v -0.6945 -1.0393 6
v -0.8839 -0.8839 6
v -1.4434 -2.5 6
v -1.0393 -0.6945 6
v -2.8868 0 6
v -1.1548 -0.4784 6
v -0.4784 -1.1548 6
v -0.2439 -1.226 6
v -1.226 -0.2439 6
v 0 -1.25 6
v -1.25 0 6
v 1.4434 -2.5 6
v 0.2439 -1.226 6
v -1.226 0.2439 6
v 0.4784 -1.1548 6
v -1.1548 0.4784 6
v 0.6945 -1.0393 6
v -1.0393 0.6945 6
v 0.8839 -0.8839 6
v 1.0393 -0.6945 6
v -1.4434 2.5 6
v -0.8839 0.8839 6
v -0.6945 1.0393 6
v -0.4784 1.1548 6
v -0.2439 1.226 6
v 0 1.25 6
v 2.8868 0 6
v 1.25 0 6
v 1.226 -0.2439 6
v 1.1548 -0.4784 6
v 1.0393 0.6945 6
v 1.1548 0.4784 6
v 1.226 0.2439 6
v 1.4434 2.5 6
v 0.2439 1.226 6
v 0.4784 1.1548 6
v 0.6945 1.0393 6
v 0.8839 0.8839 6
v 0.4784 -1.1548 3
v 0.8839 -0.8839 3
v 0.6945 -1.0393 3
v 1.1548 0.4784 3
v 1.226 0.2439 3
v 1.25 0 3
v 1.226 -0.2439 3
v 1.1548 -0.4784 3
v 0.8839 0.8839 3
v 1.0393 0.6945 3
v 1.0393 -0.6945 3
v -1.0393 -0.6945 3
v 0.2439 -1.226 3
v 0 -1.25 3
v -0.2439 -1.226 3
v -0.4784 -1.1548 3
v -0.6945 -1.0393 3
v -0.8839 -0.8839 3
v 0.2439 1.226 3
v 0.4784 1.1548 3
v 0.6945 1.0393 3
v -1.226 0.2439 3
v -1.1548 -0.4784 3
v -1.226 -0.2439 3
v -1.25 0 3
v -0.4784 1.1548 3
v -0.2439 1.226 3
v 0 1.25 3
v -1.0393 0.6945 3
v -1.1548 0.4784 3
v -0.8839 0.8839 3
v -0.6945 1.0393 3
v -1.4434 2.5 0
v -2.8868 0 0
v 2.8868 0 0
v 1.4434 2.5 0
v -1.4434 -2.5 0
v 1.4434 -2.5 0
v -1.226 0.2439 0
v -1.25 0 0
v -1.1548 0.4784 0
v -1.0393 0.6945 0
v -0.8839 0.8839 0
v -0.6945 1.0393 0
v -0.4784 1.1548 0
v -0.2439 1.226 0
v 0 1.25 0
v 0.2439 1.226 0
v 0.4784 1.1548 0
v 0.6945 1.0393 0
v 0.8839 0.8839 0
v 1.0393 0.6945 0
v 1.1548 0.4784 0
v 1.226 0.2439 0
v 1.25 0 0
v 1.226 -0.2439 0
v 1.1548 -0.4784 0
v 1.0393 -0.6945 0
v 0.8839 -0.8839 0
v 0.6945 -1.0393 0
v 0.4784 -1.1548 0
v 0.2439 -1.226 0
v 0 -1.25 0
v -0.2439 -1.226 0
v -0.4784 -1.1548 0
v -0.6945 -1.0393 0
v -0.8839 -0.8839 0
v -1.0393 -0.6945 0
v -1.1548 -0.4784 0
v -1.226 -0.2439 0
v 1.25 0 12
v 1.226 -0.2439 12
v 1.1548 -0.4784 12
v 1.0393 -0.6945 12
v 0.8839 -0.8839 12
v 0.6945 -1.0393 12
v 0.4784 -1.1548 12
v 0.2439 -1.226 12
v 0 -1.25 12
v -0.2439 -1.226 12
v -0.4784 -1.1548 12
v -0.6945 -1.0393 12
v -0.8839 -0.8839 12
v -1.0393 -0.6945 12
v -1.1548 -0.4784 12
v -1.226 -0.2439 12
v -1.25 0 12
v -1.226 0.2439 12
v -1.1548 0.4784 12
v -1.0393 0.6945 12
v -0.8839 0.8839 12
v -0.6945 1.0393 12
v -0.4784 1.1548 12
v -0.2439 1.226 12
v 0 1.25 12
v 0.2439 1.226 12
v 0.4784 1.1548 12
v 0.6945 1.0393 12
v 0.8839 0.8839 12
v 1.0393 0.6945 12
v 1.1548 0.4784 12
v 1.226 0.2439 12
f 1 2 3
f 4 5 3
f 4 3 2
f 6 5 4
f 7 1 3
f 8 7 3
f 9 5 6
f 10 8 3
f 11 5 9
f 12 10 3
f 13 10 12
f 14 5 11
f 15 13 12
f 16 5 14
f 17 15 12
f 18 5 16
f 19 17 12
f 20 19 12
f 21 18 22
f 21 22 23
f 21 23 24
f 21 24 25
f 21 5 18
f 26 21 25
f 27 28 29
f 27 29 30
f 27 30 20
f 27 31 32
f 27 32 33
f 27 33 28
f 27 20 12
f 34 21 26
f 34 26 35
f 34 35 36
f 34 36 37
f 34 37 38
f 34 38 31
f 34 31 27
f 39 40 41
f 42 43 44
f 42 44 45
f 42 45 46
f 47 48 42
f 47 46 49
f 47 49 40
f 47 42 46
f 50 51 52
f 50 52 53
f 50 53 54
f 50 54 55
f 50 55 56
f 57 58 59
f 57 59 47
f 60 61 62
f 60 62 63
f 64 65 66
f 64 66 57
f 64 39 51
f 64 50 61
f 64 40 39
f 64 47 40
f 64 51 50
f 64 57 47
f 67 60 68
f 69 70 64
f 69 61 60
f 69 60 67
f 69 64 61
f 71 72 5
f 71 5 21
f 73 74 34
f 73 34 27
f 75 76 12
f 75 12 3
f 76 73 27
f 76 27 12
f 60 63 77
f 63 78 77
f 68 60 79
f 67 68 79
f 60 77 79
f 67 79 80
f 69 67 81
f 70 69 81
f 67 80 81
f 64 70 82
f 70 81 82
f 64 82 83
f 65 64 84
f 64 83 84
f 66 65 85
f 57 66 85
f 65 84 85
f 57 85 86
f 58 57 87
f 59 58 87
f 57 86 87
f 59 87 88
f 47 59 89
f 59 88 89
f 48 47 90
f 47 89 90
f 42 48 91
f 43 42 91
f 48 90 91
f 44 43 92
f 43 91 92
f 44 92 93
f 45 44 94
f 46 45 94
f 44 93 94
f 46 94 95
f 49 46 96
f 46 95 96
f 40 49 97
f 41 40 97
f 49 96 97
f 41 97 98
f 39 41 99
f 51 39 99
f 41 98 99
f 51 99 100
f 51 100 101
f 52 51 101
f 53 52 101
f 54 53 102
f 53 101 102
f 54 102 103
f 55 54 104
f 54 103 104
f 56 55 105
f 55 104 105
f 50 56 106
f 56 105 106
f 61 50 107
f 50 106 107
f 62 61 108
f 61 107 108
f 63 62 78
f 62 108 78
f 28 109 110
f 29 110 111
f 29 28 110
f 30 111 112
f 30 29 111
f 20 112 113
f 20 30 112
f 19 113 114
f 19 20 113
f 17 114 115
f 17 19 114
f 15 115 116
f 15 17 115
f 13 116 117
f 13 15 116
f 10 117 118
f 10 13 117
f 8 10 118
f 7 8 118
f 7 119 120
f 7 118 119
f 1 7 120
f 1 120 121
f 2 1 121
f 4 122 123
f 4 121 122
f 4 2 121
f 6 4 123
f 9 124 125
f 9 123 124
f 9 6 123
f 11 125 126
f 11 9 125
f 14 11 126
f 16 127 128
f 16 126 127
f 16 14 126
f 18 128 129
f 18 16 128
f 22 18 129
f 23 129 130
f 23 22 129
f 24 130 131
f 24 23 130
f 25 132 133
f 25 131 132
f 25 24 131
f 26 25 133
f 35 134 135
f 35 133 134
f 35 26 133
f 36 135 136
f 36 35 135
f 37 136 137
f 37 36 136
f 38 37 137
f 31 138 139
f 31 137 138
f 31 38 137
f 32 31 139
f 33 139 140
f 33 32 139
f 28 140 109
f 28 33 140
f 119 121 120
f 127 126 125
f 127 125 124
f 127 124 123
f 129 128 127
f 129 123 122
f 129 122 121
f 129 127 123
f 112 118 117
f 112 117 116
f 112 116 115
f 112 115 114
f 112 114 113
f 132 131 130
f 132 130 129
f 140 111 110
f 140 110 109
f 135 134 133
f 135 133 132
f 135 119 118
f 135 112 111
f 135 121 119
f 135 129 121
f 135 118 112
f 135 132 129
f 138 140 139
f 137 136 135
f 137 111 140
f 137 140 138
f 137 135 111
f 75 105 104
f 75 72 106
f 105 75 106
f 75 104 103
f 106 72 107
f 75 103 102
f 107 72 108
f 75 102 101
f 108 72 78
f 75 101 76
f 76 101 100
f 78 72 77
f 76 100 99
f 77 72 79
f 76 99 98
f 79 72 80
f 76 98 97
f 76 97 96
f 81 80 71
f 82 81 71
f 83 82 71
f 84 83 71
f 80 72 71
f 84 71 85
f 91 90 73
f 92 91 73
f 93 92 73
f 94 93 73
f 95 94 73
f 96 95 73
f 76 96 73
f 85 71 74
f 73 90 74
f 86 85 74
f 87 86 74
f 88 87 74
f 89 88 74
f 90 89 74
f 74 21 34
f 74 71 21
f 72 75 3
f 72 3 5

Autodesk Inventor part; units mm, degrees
ref_plane "YZ Plane" through (0, 0, 0) normal (1, 0, 0) x (0, 1, 0)
ref_plane "XZ Plane" through (0, 0, 0) normal (0, 1, 0) x (-1, 0, 0)
ref_plane "XY Plane" through (0, 0, 0) normal (0, 0, 1) x (1, 0, 0)
sketch "Sketch1" plane through (0, 0, 0) normal (0, 0, 1) x (1, 0, 0)
  line L0 (2.8868, 0) -> (1.4434, -2.5)
  line L1 (1.4434, -2.5) -> (-1.4434, -2.5)
  line L2 (-1.4434, -2.5) -> (-2.8868, 0)
  line L3 (-2.8868, 0) -> (-1.4434, 2.5)
  line L4 (-1.4434, 2.5) -> (1.4434, 2.5)
  line L5 (1.4434, 2.5) -> (2.8868, 0)
  point P0 (0, 0)
  point P1 (0, 0)
  dimension "d0" = 5
extrude "Extrusion1" add sketch "Sketch1" along normal blind 6
sketch "Sketch3" plane through (0, 0, 0) normal (0, 0, -1) x (-1, 0, 0)
  circle A0 centre (0, 0) radius 1.25
  dimension "d6" = 2.5
extrude "Extrusion3" cut sketch "Sketch3" against normal through all
sketch "Sketch4" plane through (0, 0, 6) normal (0, 0, 1) x (1, 0, 0)
  circle A0 centre (0, 0) radius 1.25
  dimension "d9" = 2.5
extrude "Extrusion4" add sketch "Sketch4" along normal blind 6
sketch "Sketch5" plane through (0, 0, 6) normal (0, 0, -1) x (-1, 0, 0)
  circle A0 centre (0, 0) radius 1.25 projected
extrude "Extrusion5" add sketch "Sketch5" along normal blind 3
properties part number "M2.5x6mm_Standoff_ 971060151"
